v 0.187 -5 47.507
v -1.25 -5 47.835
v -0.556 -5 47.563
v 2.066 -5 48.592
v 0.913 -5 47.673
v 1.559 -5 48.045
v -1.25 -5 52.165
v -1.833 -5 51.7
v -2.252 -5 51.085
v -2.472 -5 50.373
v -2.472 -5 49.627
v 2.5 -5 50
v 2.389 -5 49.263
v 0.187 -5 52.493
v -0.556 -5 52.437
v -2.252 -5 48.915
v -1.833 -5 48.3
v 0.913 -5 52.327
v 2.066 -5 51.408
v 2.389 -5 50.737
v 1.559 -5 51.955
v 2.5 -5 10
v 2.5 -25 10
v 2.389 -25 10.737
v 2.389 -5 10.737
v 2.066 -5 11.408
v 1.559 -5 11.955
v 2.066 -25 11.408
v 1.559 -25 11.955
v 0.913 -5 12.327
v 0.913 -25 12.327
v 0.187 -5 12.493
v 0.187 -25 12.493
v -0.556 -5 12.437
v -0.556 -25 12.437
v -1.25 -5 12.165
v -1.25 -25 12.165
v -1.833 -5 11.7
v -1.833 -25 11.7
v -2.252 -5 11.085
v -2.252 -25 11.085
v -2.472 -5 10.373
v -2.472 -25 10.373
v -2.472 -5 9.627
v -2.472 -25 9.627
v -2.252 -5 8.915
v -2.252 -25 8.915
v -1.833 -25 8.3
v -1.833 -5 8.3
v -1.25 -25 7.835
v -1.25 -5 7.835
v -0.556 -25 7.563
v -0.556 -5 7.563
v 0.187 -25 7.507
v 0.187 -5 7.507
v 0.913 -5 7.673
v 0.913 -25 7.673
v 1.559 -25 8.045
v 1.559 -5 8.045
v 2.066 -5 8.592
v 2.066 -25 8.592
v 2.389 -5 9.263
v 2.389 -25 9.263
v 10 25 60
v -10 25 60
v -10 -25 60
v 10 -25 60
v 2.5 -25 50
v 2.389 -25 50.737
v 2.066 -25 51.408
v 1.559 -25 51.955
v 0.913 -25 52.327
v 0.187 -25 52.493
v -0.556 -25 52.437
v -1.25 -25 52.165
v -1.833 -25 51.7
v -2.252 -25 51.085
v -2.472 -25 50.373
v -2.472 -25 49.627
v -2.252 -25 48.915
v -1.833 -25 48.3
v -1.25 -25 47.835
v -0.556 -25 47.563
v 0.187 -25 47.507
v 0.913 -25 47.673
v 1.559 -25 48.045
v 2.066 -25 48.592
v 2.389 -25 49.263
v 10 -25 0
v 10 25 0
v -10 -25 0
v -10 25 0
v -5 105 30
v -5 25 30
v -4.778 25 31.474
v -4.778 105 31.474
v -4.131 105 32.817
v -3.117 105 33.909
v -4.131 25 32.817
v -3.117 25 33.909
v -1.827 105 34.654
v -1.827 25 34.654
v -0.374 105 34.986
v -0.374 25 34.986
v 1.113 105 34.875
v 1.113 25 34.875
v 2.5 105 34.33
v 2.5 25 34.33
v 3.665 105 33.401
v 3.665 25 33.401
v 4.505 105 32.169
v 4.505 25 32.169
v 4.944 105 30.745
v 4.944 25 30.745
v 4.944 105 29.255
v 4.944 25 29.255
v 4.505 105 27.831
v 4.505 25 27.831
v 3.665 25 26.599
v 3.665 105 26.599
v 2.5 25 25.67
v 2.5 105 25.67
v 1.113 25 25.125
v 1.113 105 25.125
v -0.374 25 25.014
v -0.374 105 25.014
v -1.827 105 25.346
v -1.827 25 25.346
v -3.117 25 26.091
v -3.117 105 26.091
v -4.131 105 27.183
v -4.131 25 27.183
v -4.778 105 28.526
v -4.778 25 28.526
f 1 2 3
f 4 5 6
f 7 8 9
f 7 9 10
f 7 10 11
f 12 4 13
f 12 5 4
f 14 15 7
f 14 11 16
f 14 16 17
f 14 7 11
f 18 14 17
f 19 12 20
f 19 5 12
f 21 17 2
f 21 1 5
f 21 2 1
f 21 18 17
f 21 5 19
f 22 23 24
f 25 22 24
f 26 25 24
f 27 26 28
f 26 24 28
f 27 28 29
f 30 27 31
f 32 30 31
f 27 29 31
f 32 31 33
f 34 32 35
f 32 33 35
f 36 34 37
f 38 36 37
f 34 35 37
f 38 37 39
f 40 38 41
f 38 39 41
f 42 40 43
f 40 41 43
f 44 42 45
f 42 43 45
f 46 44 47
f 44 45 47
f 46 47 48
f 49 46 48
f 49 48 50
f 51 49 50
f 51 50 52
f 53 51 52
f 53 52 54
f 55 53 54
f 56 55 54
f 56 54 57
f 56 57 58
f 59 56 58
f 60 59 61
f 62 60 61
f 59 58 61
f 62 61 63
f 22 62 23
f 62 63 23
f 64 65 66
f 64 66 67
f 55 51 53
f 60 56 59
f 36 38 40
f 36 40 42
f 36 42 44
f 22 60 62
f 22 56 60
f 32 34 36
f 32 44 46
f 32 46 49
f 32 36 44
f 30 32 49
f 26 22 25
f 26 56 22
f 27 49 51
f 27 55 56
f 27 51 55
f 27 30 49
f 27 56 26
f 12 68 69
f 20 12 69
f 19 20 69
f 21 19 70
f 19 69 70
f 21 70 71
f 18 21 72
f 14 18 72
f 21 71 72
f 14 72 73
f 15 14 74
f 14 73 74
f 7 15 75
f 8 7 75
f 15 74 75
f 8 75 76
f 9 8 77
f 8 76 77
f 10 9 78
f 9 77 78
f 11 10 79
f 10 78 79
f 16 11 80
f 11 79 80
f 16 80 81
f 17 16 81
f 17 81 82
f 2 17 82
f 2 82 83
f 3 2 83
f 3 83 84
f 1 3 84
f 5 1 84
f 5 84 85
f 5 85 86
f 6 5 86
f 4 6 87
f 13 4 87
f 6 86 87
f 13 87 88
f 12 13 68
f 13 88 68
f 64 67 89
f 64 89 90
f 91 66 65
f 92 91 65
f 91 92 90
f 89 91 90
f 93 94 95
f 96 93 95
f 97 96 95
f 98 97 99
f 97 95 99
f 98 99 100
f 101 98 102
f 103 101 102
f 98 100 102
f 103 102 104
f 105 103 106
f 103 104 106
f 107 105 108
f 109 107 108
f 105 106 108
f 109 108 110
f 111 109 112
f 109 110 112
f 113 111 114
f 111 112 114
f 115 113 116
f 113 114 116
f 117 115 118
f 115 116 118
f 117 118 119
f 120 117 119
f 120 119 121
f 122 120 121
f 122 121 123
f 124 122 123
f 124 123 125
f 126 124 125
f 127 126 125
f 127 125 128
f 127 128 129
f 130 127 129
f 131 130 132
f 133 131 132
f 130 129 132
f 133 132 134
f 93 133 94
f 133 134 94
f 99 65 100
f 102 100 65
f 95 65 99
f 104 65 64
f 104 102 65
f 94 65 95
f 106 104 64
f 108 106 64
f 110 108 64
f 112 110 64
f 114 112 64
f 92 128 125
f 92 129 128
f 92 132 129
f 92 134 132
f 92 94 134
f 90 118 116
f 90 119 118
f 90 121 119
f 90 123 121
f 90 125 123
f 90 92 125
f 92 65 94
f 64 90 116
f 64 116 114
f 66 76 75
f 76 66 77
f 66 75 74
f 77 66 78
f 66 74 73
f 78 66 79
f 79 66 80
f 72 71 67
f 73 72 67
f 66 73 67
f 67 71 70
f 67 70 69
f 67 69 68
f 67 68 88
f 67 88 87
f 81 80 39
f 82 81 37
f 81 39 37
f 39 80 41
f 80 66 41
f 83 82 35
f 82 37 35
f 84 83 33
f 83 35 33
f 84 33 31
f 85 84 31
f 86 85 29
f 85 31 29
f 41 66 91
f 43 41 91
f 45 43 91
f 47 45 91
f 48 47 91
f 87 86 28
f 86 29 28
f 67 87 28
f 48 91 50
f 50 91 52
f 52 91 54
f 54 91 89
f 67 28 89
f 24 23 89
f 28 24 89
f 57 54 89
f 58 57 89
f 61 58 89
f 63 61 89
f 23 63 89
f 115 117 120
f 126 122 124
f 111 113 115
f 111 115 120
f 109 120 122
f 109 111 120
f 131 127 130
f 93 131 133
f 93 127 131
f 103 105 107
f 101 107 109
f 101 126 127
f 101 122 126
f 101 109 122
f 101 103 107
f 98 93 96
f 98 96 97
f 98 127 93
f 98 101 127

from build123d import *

# Parameters (mm, degrees)
F0_W     = 20
F0_H     = 50
F1_DEPTH = 60
F2_R     = 2.5
F3_DEPTH = 20
F4_R     = 5
F5_DEPTH = 80


with BuildPart() as f1:
    # F0 (on Top) → F1 (new body)
    with BuildSketch(Plane.XY):
        Rectangle(F0_W, F0_H)
    extrude(amount=F1_DEPTH)

    # F2 (on face) → F3 (cut)
    with BuildSketch(Plane.XZ.offset(25)):
        with Locations((0, 50)):
            Circle(F2_R)
        with Locations((0, 10)):
            Circle(F2_R)
    extrude(amount=-F3_DEPTH, mode=Mode.SUBTRACT)

    # F4 (on face) → F5 (join)
    with BuildSketch(Plane(origin=(0, 25, 0), x_dir=(-1, 0, 0), z_dir=(0, 1, 0))):
        with Locations((0, 30)):
            Circle(F4_R)
    extrude(amount=F5_DEPTH)


solid = f1.part
